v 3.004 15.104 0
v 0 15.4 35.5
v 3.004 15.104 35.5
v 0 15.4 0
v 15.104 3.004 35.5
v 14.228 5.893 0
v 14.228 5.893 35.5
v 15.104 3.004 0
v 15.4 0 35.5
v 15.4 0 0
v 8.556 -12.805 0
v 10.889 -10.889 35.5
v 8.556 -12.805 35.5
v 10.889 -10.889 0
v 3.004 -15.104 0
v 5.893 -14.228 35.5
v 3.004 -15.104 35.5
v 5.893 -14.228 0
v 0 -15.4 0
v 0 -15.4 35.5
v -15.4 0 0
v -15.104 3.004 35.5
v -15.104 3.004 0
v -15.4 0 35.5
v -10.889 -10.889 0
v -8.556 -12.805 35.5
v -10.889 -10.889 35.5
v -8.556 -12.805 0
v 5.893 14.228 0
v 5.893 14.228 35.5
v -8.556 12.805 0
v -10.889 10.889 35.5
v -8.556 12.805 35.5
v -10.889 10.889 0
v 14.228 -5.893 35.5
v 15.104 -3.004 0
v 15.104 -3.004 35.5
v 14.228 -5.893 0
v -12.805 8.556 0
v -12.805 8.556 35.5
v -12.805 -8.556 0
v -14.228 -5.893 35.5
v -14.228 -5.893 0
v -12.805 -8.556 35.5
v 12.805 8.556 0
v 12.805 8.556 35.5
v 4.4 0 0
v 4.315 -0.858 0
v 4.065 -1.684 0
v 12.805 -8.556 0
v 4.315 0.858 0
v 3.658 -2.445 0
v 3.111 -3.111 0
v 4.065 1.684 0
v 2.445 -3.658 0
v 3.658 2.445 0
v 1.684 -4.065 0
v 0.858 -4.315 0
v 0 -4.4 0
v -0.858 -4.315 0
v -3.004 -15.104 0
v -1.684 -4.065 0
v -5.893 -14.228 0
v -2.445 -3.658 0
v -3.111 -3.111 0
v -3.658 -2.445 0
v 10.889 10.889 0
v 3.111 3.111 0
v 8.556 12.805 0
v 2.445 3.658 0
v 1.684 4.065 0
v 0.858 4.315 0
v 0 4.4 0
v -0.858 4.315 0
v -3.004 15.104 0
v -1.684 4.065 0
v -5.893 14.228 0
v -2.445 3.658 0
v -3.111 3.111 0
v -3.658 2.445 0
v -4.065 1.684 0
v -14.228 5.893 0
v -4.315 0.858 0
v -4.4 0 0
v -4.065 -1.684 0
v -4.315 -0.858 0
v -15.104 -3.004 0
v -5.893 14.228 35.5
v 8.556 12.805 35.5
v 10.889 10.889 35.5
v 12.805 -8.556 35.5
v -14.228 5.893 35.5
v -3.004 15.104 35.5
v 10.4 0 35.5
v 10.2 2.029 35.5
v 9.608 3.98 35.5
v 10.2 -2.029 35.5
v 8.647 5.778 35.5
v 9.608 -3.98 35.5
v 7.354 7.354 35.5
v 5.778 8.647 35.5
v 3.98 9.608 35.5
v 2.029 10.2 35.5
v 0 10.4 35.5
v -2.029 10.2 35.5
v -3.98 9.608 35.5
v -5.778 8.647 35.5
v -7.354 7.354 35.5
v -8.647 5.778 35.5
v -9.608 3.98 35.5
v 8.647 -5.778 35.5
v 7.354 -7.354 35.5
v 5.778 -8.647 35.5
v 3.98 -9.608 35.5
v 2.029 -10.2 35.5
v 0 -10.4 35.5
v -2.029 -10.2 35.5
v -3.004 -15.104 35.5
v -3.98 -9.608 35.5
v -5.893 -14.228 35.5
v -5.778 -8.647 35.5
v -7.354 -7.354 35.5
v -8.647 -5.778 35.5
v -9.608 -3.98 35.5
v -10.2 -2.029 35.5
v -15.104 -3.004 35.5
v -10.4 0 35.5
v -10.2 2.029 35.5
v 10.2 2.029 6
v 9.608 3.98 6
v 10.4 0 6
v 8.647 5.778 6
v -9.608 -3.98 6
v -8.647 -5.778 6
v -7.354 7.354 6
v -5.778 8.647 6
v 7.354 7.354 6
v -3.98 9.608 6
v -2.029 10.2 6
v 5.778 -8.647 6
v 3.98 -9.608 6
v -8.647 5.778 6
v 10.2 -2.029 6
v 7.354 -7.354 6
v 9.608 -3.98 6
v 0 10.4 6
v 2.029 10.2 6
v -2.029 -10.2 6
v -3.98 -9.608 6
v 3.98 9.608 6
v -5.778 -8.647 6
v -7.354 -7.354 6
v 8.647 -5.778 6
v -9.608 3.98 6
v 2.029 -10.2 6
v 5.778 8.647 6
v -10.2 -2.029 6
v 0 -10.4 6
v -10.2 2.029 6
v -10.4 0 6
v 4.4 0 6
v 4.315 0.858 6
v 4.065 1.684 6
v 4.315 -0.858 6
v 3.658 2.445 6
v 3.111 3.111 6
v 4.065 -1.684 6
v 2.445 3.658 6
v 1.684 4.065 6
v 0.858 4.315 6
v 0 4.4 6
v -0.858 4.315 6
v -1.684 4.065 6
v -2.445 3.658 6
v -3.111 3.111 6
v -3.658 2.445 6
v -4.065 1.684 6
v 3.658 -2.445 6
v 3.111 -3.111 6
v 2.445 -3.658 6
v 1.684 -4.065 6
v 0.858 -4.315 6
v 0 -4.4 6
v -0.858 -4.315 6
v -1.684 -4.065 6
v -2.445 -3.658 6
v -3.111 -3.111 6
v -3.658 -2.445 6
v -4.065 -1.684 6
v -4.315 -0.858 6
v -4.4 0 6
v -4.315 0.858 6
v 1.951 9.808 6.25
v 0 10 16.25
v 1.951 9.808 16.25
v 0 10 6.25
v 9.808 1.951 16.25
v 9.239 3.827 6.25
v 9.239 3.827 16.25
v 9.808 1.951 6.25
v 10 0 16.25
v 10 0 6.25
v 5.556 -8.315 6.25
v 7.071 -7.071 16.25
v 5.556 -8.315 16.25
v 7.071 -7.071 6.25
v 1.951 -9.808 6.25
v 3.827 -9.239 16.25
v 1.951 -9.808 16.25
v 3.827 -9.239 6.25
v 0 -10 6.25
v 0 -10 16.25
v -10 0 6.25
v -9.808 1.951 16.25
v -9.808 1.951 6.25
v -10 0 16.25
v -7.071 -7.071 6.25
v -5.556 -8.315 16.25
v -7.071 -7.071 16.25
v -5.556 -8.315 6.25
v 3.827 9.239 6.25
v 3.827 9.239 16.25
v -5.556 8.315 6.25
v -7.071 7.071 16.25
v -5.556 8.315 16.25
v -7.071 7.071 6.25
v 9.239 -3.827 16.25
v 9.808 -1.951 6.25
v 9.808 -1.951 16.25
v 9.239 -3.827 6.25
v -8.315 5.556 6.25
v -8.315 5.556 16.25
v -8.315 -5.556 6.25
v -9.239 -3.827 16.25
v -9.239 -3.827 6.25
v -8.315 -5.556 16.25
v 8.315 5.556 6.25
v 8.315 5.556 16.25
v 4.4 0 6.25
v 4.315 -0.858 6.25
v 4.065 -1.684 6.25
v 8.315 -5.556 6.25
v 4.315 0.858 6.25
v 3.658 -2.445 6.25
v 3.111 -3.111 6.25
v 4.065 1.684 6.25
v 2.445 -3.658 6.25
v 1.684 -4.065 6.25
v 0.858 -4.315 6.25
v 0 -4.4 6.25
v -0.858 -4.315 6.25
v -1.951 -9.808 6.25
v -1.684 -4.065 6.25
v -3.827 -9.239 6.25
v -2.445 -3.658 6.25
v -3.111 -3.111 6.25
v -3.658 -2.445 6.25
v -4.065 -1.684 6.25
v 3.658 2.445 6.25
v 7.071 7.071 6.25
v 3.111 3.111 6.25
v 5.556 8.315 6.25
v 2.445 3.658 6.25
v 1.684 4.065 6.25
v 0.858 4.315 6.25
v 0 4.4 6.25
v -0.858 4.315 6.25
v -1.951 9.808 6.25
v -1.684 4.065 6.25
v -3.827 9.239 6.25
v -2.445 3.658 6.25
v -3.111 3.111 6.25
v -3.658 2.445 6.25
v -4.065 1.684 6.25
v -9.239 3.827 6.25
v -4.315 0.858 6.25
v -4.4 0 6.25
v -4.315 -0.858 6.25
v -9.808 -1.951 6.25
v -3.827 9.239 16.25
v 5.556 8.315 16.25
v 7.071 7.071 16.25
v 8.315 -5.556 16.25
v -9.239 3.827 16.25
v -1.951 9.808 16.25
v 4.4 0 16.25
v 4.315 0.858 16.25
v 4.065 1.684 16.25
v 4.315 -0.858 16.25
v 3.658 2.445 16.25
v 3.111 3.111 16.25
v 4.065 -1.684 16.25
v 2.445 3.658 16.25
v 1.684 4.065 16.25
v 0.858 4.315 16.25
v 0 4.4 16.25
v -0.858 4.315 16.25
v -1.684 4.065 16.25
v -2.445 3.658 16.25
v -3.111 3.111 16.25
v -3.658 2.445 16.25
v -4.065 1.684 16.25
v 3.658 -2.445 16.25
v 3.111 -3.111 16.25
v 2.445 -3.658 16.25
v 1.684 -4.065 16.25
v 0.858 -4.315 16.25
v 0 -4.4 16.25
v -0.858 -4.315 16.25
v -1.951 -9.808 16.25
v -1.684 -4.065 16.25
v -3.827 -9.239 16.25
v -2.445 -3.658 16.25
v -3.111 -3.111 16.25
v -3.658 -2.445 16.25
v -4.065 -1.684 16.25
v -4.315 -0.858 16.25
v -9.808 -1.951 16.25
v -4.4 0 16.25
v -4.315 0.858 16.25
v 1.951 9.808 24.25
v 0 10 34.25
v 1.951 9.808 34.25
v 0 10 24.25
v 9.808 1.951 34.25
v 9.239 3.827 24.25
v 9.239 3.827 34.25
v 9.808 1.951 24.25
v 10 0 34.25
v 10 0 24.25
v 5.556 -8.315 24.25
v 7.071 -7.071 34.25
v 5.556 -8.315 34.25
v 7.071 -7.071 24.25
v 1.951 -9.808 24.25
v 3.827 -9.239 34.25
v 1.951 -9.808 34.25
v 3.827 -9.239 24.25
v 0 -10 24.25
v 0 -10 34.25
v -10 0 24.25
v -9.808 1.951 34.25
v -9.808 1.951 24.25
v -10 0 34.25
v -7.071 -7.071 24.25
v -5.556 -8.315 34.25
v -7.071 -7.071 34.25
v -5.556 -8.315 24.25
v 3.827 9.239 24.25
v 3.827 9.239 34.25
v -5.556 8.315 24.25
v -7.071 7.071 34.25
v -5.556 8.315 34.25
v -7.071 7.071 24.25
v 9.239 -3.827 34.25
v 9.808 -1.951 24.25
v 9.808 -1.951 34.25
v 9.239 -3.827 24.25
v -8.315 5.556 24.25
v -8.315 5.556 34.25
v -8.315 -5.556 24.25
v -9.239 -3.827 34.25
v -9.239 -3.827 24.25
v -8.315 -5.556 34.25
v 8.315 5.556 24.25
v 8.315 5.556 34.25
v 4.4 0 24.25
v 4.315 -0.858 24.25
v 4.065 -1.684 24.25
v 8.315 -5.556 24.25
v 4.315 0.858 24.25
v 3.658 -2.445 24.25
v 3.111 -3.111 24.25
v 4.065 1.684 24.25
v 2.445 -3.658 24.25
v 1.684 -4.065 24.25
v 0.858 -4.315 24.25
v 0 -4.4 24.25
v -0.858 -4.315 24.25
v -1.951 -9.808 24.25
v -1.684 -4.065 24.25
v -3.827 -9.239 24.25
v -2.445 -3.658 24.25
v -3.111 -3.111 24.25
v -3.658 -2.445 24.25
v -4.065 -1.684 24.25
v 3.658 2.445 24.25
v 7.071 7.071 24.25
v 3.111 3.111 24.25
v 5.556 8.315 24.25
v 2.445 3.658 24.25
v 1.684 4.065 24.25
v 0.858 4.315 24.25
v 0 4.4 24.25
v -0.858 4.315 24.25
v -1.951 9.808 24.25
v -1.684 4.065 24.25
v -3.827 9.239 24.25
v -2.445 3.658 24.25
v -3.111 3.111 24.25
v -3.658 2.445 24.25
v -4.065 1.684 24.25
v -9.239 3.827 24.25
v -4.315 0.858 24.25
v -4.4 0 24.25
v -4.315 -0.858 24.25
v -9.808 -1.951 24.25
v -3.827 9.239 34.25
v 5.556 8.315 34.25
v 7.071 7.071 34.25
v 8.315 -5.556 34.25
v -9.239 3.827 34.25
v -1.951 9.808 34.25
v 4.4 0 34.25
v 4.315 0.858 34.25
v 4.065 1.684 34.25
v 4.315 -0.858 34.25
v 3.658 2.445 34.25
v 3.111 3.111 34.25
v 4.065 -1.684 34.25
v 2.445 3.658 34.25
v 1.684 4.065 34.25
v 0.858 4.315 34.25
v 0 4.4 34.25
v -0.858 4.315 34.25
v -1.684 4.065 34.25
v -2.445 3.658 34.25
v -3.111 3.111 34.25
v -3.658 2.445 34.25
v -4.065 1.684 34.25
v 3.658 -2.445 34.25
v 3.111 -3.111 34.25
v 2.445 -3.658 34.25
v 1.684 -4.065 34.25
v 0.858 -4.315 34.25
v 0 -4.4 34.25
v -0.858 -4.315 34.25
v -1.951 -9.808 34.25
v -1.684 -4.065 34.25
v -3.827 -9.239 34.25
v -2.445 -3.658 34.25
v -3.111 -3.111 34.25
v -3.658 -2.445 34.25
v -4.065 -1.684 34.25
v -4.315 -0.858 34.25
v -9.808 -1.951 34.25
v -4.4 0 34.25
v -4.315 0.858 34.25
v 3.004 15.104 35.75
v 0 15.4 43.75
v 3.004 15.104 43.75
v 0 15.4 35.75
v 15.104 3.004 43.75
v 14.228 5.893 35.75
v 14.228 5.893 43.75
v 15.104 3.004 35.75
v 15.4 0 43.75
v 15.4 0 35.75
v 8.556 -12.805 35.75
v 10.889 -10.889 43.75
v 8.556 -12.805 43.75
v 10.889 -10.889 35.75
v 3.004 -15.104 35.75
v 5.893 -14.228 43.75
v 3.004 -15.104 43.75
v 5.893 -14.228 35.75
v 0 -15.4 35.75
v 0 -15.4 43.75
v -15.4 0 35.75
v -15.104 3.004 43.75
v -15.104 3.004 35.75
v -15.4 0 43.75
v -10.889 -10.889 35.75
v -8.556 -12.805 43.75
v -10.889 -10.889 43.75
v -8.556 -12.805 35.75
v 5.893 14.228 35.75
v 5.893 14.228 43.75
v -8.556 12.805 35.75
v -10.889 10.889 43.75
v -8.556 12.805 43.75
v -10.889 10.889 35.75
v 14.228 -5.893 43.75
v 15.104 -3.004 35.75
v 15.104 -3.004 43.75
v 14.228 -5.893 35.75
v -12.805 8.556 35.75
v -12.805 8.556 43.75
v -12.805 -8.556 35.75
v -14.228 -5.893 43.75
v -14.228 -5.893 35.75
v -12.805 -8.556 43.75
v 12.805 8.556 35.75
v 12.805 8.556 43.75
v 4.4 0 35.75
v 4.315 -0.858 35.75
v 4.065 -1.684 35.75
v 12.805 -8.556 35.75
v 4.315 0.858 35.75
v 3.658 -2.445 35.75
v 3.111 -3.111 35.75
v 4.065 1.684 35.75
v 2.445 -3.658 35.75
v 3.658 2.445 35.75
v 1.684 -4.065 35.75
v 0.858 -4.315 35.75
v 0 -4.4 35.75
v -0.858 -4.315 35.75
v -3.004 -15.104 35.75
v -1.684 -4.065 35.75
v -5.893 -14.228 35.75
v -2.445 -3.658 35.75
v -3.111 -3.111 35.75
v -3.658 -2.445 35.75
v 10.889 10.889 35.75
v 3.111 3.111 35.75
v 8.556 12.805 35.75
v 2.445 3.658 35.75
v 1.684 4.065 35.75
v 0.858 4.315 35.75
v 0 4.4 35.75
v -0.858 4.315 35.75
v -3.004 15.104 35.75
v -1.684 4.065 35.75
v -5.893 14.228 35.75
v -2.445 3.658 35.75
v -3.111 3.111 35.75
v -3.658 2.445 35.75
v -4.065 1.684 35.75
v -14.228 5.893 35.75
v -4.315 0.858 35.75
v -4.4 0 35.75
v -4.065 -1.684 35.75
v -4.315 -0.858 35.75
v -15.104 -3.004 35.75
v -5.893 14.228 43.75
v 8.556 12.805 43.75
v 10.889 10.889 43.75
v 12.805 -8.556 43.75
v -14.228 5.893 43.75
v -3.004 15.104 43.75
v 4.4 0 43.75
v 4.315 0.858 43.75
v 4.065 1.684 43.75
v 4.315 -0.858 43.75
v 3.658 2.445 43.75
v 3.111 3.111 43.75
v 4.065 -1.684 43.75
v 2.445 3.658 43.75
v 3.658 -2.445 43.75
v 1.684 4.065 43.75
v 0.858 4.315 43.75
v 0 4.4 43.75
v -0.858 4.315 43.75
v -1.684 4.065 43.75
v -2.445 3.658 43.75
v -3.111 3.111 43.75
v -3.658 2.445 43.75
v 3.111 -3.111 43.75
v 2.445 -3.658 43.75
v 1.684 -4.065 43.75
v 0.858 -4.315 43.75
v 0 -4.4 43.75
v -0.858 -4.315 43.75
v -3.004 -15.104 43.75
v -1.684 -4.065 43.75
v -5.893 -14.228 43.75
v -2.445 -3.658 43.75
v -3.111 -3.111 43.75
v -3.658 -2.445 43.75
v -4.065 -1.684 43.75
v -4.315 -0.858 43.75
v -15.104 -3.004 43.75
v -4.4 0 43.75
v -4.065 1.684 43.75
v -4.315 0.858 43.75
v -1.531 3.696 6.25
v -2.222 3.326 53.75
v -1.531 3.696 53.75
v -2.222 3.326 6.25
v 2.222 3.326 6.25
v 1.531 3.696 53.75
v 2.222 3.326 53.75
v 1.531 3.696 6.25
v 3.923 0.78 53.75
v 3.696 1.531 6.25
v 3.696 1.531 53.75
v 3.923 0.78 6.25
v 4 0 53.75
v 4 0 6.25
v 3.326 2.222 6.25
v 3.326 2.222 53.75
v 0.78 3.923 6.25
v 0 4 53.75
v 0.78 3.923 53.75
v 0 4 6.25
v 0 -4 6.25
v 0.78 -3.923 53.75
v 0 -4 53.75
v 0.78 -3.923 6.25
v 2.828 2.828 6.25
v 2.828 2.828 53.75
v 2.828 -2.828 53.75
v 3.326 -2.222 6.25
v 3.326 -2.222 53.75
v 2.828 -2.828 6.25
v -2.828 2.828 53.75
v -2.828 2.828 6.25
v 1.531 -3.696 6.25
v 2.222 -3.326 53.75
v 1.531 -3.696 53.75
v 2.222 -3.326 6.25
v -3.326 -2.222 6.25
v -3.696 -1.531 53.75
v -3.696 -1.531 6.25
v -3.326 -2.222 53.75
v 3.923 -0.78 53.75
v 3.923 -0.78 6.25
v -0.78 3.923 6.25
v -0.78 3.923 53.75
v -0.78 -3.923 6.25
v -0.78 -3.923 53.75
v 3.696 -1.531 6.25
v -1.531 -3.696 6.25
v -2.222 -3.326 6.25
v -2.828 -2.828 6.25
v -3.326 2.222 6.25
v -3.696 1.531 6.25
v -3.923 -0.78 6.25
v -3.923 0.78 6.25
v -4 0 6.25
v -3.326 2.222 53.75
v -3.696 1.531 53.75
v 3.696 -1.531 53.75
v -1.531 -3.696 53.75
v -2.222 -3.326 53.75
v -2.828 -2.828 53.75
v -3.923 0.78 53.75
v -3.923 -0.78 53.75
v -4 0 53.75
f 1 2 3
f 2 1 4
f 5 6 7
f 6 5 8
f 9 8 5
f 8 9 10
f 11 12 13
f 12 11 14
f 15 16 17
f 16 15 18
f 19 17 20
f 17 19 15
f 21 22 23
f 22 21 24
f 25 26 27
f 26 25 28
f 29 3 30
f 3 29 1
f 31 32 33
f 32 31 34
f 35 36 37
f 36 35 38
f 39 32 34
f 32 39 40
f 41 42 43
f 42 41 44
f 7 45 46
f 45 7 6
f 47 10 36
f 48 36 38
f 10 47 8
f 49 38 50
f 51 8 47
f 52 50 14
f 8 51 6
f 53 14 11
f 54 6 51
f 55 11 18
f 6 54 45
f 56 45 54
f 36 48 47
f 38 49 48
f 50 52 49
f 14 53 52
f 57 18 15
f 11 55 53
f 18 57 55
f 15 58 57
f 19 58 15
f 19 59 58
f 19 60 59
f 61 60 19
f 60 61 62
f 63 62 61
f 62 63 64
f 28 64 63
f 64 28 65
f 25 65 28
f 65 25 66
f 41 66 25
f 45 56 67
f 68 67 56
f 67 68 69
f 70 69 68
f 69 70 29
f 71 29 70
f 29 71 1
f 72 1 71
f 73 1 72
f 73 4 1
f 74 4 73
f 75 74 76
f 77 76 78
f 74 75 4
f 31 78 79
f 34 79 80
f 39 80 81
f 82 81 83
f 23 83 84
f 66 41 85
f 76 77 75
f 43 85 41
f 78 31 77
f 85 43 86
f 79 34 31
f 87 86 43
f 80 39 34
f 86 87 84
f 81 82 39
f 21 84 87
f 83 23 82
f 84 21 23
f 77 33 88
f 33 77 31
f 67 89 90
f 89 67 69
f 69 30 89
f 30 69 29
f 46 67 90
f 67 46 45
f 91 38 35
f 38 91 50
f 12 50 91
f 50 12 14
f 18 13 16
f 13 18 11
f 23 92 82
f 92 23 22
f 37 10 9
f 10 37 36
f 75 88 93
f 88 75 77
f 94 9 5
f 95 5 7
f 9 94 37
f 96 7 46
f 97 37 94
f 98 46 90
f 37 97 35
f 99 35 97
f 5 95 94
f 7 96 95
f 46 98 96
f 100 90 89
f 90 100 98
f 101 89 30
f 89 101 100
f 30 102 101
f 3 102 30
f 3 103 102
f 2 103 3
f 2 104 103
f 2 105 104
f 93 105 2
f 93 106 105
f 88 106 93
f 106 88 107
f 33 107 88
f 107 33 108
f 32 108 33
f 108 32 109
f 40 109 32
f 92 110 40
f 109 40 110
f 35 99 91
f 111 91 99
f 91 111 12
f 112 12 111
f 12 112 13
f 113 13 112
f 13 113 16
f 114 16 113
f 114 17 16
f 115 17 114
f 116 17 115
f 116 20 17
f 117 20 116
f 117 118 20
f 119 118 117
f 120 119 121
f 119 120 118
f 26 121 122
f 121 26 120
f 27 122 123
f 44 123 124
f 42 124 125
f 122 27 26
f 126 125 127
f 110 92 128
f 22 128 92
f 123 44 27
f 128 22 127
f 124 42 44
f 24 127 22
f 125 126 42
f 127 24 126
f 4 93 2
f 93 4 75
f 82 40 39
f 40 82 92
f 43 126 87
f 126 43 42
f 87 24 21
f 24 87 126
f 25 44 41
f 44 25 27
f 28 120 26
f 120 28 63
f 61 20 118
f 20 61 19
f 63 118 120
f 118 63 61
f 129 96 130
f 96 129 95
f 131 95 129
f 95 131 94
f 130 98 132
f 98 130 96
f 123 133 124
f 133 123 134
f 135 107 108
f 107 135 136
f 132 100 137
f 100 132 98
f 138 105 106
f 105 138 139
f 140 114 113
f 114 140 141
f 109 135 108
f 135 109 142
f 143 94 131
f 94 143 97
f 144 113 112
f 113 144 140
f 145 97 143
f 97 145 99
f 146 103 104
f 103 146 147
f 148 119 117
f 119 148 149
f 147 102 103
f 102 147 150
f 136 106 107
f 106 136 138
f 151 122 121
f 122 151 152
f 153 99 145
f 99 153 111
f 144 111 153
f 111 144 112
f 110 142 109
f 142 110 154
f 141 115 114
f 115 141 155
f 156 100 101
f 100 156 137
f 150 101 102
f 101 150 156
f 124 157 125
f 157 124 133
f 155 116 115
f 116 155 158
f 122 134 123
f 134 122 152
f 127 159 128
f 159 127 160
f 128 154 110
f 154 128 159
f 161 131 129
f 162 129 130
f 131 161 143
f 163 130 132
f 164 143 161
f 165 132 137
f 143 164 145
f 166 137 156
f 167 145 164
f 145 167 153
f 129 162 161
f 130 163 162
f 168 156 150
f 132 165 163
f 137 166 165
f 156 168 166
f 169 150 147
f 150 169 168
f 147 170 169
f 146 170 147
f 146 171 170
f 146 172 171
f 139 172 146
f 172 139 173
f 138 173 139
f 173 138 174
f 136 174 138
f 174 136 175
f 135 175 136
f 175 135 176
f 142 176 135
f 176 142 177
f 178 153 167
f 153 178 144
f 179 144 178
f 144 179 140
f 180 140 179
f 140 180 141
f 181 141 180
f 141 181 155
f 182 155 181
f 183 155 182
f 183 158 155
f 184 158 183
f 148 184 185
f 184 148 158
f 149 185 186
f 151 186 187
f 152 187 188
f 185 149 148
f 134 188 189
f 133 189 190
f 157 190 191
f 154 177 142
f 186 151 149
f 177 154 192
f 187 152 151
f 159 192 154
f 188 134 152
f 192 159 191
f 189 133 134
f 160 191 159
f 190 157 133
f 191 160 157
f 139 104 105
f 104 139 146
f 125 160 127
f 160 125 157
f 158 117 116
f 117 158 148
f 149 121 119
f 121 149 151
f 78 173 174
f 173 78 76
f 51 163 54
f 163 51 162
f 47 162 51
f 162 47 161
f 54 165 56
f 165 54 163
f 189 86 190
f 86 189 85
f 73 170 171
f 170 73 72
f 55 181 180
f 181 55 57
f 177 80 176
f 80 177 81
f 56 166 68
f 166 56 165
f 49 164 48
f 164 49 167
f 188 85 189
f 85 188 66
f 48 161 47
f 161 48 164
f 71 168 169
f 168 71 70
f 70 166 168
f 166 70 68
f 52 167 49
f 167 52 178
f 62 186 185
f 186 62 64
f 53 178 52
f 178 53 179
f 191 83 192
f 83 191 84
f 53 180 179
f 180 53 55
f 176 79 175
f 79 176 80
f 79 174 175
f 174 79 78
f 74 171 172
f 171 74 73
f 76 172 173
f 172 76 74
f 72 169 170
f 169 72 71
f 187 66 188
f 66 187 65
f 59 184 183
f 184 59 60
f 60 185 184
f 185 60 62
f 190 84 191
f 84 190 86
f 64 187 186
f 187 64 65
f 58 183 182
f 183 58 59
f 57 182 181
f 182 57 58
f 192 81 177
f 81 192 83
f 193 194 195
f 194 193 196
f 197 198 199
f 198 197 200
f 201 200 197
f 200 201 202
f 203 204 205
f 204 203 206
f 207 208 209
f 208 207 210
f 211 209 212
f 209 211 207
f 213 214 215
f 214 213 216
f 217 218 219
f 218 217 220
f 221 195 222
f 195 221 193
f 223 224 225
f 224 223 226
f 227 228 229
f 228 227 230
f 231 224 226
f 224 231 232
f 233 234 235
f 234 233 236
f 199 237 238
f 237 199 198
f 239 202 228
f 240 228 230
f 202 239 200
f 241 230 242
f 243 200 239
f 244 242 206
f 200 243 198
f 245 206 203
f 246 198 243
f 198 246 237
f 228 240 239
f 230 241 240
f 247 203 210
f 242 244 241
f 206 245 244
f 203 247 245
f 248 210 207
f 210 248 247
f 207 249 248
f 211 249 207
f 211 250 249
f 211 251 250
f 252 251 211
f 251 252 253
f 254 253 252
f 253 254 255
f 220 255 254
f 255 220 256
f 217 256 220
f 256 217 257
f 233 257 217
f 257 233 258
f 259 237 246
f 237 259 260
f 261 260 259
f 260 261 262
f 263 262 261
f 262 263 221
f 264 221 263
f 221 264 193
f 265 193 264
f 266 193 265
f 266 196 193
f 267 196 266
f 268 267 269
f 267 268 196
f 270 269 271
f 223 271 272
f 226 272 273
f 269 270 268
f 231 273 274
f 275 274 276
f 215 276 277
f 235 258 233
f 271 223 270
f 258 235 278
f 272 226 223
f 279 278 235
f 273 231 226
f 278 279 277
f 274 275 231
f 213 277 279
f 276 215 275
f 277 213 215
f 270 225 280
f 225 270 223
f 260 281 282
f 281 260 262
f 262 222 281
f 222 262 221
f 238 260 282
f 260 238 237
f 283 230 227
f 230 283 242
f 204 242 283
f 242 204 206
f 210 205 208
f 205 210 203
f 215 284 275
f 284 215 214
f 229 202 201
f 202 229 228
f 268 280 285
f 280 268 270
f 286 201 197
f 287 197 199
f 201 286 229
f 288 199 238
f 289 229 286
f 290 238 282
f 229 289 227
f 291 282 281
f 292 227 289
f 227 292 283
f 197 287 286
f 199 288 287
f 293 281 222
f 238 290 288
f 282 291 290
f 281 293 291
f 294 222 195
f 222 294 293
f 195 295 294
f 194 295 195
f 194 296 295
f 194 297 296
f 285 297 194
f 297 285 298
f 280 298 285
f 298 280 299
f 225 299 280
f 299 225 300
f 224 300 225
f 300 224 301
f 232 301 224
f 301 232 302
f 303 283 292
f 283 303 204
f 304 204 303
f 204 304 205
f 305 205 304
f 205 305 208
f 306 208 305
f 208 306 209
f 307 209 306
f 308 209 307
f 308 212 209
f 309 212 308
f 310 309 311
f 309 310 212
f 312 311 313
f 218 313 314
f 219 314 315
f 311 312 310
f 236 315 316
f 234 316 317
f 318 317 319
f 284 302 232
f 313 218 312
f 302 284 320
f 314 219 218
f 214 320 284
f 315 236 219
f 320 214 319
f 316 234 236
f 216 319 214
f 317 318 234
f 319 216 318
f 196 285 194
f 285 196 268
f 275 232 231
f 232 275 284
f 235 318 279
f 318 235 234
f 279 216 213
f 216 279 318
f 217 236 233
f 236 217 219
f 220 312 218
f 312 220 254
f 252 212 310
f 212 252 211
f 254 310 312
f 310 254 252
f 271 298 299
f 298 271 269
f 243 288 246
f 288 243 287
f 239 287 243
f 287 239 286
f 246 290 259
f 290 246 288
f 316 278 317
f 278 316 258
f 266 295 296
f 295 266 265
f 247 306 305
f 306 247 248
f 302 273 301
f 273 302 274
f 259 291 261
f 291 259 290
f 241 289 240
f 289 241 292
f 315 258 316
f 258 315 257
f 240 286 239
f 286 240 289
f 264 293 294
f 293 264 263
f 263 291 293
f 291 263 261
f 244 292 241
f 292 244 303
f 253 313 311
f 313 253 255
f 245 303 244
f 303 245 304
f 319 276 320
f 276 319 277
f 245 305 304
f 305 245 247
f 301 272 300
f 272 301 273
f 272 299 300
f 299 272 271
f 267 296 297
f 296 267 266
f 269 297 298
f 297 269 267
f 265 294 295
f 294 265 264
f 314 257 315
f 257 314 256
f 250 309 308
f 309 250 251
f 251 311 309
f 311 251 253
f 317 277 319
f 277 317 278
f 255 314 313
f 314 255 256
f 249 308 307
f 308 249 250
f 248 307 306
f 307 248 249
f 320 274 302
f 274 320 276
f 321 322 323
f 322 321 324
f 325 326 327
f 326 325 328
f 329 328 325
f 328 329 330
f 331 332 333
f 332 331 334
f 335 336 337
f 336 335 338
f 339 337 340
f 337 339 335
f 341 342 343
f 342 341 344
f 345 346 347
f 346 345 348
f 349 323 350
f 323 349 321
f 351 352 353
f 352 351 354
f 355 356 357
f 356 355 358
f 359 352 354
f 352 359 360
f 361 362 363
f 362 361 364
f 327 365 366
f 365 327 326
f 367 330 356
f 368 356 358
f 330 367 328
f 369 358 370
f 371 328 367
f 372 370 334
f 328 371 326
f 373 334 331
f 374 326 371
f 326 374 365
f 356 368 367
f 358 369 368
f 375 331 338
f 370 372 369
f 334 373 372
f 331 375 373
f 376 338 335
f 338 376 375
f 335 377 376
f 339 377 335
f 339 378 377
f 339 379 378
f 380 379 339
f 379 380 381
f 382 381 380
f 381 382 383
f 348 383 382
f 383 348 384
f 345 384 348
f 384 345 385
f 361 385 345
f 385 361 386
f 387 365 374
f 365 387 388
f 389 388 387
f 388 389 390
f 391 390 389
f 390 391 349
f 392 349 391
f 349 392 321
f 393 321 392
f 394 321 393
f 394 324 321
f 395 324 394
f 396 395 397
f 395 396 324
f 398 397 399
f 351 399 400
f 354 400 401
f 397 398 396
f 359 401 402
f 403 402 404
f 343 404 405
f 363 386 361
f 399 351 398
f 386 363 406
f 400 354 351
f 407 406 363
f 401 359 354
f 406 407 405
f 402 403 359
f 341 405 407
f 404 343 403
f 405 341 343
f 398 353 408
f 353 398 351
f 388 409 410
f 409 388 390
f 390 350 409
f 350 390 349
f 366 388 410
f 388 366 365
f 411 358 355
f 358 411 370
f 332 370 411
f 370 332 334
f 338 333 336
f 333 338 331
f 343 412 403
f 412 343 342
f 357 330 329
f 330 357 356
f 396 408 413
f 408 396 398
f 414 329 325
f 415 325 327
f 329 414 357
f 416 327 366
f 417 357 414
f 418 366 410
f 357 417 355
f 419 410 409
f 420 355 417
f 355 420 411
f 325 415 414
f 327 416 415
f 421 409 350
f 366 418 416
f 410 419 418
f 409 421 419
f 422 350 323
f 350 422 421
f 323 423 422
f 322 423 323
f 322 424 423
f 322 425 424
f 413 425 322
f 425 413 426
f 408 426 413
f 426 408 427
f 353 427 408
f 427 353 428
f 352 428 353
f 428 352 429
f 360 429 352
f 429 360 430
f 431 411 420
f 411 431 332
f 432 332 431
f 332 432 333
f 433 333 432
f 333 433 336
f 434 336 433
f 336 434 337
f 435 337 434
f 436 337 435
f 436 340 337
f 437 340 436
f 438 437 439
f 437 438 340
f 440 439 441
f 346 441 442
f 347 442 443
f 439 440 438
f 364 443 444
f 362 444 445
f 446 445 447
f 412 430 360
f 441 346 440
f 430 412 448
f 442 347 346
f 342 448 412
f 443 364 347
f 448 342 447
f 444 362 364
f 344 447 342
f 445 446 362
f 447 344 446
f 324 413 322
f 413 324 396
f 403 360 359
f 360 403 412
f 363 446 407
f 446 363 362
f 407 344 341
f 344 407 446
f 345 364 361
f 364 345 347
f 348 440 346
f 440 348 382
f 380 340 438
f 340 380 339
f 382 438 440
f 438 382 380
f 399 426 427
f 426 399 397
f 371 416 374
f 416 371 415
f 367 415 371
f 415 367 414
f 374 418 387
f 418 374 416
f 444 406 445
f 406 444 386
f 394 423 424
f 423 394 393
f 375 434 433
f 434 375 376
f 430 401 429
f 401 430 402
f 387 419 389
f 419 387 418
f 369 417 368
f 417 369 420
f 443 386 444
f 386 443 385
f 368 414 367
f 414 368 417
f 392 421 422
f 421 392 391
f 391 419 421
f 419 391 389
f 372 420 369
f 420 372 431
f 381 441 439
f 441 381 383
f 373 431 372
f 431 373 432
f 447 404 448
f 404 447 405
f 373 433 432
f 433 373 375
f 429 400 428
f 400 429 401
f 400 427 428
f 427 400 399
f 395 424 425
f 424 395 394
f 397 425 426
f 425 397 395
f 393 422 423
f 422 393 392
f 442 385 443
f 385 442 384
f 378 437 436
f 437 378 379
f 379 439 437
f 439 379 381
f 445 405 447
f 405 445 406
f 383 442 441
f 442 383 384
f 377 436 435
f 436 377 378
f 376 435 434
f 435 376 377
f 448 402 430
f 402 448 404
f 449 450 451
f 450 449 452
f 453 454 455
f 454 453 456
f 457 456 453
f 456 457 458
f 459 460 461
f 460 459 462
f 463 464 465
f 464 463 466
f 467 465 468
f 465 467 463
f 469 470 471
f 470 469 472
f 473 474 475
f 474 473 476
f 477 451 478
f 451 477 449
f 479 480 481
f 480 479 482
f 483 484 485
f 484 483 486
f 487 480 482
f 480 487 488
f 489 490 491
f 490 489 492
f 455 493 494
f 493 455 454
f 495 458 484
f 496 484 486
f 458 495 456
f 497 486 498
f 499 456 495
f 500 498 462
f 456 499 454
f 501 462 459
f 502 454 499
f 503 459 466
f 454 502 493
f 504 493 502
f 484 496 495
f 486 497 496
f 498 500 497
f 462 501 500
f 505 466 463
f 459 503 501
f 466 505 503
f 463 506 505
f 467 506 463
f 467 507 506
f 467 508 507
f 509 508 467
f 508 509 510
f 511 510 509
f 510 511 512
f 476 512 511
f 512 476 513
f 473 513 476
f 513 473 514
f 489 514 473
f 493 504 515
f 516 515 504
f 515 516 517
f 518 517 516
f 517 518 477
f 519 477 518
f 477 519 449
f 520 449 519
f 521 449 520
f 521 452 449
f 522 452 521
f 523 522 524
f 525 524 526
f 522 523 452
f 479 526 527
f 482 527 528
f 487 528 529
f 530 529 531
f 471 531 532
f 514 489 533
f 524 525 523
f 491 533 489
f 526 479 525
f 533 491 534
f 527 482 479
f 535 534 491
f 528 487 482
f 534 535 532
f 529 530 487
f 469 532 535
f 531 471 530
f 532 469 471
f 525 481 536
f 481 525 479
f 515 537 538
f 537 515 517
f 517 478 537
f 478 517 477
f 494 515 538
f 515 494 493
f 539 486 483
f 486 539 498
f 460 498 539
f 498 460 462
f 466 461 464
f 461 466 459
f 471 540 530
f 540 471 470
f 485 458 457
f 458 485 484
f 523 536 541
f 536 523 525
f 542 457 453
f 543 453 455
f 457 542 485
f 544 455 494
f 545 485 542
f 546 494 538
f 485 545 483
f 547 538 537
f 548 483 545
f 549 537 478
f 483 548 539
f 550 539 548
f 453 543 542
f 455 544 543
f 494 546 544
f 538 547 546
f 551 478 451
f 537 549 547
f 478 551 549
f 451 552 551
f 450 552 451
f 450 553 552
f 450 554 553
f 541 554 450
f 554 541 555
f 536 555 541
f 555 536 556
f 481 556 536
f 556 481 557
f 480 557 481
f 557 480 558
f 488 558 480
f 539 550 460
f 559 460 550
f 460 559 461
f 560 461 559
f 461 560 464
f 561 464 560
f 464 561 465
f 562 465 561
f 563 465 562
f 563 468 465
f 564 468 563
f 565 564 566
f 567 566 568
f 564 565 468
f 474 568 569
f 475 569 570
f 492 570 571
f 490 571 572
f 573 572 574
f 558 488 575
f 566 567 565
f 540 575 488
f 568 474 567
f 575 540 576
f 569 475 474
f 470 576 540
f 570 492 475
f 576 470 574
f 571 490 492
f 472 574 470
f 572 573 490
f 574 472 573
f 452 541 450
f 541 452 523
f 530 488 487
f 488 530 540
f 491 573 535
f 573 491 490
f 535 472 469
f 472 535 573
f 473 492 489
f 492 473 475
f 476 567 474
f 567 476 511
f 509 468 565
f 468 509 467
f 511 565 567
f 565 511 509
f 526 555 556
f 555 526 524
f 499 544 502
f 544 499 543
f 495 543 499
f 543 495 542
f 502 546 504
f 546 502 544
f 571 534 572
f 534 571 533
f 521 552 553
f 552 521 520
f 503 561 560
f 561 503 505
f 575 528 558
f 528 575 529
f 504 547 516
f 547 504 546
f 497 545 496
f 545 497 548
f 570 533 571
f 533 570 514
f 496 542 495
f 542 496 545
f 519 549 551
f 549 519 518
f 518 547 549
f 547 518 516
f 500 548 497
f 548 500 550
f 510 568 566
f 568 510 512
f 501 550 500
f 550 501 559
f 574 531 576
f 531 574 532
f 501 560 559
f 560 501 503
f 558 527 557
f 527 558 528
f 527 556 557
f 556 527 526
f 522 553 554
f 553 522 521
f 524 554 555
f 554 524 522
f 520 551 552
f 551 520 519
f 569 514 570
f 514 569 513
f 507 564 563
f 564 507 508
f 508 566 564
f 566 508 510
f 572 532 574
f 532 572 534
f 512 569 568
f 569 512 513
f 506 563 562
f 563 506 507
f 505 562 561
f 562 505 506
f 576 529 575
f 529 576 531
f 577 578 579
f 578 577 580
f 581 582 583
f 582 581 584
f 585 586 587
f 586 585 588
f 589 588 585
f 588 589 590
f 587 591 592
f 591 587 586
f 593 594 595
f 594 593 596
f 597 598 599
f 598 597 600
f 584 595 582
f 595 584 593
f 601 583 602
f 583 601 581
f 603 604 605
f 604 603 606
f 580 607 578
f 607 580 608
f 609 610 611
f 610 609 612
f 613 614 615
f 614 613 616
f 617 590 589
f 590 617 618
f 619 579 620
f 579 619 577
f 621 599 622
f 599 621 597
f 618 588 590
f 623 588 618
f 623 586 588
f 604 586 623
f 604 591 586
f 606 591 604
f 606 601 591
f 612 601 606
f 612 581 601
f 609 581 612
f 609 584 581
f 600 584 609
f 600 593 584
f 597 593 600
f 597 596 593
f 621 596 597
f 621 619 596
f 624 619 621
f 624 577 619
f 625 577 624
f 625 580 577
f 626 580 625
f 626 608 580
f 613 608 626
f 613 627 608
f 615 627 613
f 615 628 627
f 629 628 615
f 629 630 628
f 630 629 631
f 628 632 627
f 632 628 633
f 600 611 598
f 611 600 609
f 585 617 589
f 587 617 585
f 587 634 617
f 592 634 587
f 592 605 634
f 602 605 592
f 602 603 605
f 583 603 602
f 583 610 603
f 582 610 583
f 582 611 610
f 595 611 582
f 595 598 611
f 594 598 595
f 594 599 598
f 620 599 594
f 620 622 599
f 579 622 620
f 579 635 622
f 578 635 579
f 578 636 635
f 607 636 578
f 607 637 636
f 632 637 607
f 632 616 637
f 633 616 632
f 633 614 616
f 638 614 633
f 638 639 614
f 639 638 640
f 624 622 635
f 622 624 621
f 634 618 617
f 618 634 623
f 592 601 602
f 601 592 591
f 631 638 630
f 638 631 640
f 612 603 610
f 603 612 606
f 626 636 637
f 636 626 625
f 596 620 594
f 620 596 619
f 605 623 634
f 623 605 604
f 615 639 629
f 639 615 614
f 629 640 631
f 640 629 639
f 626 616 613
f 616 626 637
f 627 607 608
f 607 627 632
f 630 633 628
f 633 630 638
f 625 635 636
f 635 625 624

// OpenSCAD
$fn = 32;

// ------------------------------------------------------------------------
// Shaft station: cup d30.8 x 35.5 mm, shaft d8
// Every part is its own module, assembly() places every instance.
// ------------------------------------------------------------------------

// --- part 1 ---
module housing_cup() {
  difference() {
    cylinder(h = 35.5, d = 30.8);
    translate([0, 0, 6]) cylinder(h = 30.5, d = 20.8);
    translate([0, 0, -1]) cylinder(h = 8, d = 8.8);
  }
}

// --- part 2 ---
module bearing_lower() {
  difference() {
      translate([0, 0, 0]) cylinder(h = 10, d = 20);
      translate([0, 0, -1]) cylinder(h = 12, d = 8.8);
    }
}

// --- part 3 ---
module bearing_upper() {
  difference() {
      translate([0, 0, 0]) cylinder(h = 10, d = 20);
      translate([0, 0, -1]) cylinder(h = 12, d = 8.8);
    }
}

// --- part 4 ---
module station_shaft() {
  translate([0, 0, -23.75]) cylinder(h = 47.5, d = 8);
}

// --- part 5 ---
module station_cover() {
  difference() {
    cylinder(h = 8, d = 30.8);
    translate([0, 0, -1]) cylinder(h = 10, d = 8.8);
  }
}

// --- assembly ---
module assembly() {
  color([0.80, 0.24, 0.20]) translate([0, 0, 0]) rotate([0, 0, 0]) housing_cup();
  color([0.20, 0.45, 0.75]) translate([0, 0, 6.25]) rotate([0, 0, 0]) bearing_lower();
  color([0.25, 0.62, 0.32]) translate([0, 0, 24.25]) rotate([0, 0, 0]) bearing_upper();
  color([0.92, 0.70, 0.18]) translate([0, 0, 30]) rotate([0, 0, 0]) station_shaft();
  color([0.58, 0.35, 0.70]) translate([0, 0, 35.75]) rotate([0, 0, 0]) station_cover();
}

assembly();
